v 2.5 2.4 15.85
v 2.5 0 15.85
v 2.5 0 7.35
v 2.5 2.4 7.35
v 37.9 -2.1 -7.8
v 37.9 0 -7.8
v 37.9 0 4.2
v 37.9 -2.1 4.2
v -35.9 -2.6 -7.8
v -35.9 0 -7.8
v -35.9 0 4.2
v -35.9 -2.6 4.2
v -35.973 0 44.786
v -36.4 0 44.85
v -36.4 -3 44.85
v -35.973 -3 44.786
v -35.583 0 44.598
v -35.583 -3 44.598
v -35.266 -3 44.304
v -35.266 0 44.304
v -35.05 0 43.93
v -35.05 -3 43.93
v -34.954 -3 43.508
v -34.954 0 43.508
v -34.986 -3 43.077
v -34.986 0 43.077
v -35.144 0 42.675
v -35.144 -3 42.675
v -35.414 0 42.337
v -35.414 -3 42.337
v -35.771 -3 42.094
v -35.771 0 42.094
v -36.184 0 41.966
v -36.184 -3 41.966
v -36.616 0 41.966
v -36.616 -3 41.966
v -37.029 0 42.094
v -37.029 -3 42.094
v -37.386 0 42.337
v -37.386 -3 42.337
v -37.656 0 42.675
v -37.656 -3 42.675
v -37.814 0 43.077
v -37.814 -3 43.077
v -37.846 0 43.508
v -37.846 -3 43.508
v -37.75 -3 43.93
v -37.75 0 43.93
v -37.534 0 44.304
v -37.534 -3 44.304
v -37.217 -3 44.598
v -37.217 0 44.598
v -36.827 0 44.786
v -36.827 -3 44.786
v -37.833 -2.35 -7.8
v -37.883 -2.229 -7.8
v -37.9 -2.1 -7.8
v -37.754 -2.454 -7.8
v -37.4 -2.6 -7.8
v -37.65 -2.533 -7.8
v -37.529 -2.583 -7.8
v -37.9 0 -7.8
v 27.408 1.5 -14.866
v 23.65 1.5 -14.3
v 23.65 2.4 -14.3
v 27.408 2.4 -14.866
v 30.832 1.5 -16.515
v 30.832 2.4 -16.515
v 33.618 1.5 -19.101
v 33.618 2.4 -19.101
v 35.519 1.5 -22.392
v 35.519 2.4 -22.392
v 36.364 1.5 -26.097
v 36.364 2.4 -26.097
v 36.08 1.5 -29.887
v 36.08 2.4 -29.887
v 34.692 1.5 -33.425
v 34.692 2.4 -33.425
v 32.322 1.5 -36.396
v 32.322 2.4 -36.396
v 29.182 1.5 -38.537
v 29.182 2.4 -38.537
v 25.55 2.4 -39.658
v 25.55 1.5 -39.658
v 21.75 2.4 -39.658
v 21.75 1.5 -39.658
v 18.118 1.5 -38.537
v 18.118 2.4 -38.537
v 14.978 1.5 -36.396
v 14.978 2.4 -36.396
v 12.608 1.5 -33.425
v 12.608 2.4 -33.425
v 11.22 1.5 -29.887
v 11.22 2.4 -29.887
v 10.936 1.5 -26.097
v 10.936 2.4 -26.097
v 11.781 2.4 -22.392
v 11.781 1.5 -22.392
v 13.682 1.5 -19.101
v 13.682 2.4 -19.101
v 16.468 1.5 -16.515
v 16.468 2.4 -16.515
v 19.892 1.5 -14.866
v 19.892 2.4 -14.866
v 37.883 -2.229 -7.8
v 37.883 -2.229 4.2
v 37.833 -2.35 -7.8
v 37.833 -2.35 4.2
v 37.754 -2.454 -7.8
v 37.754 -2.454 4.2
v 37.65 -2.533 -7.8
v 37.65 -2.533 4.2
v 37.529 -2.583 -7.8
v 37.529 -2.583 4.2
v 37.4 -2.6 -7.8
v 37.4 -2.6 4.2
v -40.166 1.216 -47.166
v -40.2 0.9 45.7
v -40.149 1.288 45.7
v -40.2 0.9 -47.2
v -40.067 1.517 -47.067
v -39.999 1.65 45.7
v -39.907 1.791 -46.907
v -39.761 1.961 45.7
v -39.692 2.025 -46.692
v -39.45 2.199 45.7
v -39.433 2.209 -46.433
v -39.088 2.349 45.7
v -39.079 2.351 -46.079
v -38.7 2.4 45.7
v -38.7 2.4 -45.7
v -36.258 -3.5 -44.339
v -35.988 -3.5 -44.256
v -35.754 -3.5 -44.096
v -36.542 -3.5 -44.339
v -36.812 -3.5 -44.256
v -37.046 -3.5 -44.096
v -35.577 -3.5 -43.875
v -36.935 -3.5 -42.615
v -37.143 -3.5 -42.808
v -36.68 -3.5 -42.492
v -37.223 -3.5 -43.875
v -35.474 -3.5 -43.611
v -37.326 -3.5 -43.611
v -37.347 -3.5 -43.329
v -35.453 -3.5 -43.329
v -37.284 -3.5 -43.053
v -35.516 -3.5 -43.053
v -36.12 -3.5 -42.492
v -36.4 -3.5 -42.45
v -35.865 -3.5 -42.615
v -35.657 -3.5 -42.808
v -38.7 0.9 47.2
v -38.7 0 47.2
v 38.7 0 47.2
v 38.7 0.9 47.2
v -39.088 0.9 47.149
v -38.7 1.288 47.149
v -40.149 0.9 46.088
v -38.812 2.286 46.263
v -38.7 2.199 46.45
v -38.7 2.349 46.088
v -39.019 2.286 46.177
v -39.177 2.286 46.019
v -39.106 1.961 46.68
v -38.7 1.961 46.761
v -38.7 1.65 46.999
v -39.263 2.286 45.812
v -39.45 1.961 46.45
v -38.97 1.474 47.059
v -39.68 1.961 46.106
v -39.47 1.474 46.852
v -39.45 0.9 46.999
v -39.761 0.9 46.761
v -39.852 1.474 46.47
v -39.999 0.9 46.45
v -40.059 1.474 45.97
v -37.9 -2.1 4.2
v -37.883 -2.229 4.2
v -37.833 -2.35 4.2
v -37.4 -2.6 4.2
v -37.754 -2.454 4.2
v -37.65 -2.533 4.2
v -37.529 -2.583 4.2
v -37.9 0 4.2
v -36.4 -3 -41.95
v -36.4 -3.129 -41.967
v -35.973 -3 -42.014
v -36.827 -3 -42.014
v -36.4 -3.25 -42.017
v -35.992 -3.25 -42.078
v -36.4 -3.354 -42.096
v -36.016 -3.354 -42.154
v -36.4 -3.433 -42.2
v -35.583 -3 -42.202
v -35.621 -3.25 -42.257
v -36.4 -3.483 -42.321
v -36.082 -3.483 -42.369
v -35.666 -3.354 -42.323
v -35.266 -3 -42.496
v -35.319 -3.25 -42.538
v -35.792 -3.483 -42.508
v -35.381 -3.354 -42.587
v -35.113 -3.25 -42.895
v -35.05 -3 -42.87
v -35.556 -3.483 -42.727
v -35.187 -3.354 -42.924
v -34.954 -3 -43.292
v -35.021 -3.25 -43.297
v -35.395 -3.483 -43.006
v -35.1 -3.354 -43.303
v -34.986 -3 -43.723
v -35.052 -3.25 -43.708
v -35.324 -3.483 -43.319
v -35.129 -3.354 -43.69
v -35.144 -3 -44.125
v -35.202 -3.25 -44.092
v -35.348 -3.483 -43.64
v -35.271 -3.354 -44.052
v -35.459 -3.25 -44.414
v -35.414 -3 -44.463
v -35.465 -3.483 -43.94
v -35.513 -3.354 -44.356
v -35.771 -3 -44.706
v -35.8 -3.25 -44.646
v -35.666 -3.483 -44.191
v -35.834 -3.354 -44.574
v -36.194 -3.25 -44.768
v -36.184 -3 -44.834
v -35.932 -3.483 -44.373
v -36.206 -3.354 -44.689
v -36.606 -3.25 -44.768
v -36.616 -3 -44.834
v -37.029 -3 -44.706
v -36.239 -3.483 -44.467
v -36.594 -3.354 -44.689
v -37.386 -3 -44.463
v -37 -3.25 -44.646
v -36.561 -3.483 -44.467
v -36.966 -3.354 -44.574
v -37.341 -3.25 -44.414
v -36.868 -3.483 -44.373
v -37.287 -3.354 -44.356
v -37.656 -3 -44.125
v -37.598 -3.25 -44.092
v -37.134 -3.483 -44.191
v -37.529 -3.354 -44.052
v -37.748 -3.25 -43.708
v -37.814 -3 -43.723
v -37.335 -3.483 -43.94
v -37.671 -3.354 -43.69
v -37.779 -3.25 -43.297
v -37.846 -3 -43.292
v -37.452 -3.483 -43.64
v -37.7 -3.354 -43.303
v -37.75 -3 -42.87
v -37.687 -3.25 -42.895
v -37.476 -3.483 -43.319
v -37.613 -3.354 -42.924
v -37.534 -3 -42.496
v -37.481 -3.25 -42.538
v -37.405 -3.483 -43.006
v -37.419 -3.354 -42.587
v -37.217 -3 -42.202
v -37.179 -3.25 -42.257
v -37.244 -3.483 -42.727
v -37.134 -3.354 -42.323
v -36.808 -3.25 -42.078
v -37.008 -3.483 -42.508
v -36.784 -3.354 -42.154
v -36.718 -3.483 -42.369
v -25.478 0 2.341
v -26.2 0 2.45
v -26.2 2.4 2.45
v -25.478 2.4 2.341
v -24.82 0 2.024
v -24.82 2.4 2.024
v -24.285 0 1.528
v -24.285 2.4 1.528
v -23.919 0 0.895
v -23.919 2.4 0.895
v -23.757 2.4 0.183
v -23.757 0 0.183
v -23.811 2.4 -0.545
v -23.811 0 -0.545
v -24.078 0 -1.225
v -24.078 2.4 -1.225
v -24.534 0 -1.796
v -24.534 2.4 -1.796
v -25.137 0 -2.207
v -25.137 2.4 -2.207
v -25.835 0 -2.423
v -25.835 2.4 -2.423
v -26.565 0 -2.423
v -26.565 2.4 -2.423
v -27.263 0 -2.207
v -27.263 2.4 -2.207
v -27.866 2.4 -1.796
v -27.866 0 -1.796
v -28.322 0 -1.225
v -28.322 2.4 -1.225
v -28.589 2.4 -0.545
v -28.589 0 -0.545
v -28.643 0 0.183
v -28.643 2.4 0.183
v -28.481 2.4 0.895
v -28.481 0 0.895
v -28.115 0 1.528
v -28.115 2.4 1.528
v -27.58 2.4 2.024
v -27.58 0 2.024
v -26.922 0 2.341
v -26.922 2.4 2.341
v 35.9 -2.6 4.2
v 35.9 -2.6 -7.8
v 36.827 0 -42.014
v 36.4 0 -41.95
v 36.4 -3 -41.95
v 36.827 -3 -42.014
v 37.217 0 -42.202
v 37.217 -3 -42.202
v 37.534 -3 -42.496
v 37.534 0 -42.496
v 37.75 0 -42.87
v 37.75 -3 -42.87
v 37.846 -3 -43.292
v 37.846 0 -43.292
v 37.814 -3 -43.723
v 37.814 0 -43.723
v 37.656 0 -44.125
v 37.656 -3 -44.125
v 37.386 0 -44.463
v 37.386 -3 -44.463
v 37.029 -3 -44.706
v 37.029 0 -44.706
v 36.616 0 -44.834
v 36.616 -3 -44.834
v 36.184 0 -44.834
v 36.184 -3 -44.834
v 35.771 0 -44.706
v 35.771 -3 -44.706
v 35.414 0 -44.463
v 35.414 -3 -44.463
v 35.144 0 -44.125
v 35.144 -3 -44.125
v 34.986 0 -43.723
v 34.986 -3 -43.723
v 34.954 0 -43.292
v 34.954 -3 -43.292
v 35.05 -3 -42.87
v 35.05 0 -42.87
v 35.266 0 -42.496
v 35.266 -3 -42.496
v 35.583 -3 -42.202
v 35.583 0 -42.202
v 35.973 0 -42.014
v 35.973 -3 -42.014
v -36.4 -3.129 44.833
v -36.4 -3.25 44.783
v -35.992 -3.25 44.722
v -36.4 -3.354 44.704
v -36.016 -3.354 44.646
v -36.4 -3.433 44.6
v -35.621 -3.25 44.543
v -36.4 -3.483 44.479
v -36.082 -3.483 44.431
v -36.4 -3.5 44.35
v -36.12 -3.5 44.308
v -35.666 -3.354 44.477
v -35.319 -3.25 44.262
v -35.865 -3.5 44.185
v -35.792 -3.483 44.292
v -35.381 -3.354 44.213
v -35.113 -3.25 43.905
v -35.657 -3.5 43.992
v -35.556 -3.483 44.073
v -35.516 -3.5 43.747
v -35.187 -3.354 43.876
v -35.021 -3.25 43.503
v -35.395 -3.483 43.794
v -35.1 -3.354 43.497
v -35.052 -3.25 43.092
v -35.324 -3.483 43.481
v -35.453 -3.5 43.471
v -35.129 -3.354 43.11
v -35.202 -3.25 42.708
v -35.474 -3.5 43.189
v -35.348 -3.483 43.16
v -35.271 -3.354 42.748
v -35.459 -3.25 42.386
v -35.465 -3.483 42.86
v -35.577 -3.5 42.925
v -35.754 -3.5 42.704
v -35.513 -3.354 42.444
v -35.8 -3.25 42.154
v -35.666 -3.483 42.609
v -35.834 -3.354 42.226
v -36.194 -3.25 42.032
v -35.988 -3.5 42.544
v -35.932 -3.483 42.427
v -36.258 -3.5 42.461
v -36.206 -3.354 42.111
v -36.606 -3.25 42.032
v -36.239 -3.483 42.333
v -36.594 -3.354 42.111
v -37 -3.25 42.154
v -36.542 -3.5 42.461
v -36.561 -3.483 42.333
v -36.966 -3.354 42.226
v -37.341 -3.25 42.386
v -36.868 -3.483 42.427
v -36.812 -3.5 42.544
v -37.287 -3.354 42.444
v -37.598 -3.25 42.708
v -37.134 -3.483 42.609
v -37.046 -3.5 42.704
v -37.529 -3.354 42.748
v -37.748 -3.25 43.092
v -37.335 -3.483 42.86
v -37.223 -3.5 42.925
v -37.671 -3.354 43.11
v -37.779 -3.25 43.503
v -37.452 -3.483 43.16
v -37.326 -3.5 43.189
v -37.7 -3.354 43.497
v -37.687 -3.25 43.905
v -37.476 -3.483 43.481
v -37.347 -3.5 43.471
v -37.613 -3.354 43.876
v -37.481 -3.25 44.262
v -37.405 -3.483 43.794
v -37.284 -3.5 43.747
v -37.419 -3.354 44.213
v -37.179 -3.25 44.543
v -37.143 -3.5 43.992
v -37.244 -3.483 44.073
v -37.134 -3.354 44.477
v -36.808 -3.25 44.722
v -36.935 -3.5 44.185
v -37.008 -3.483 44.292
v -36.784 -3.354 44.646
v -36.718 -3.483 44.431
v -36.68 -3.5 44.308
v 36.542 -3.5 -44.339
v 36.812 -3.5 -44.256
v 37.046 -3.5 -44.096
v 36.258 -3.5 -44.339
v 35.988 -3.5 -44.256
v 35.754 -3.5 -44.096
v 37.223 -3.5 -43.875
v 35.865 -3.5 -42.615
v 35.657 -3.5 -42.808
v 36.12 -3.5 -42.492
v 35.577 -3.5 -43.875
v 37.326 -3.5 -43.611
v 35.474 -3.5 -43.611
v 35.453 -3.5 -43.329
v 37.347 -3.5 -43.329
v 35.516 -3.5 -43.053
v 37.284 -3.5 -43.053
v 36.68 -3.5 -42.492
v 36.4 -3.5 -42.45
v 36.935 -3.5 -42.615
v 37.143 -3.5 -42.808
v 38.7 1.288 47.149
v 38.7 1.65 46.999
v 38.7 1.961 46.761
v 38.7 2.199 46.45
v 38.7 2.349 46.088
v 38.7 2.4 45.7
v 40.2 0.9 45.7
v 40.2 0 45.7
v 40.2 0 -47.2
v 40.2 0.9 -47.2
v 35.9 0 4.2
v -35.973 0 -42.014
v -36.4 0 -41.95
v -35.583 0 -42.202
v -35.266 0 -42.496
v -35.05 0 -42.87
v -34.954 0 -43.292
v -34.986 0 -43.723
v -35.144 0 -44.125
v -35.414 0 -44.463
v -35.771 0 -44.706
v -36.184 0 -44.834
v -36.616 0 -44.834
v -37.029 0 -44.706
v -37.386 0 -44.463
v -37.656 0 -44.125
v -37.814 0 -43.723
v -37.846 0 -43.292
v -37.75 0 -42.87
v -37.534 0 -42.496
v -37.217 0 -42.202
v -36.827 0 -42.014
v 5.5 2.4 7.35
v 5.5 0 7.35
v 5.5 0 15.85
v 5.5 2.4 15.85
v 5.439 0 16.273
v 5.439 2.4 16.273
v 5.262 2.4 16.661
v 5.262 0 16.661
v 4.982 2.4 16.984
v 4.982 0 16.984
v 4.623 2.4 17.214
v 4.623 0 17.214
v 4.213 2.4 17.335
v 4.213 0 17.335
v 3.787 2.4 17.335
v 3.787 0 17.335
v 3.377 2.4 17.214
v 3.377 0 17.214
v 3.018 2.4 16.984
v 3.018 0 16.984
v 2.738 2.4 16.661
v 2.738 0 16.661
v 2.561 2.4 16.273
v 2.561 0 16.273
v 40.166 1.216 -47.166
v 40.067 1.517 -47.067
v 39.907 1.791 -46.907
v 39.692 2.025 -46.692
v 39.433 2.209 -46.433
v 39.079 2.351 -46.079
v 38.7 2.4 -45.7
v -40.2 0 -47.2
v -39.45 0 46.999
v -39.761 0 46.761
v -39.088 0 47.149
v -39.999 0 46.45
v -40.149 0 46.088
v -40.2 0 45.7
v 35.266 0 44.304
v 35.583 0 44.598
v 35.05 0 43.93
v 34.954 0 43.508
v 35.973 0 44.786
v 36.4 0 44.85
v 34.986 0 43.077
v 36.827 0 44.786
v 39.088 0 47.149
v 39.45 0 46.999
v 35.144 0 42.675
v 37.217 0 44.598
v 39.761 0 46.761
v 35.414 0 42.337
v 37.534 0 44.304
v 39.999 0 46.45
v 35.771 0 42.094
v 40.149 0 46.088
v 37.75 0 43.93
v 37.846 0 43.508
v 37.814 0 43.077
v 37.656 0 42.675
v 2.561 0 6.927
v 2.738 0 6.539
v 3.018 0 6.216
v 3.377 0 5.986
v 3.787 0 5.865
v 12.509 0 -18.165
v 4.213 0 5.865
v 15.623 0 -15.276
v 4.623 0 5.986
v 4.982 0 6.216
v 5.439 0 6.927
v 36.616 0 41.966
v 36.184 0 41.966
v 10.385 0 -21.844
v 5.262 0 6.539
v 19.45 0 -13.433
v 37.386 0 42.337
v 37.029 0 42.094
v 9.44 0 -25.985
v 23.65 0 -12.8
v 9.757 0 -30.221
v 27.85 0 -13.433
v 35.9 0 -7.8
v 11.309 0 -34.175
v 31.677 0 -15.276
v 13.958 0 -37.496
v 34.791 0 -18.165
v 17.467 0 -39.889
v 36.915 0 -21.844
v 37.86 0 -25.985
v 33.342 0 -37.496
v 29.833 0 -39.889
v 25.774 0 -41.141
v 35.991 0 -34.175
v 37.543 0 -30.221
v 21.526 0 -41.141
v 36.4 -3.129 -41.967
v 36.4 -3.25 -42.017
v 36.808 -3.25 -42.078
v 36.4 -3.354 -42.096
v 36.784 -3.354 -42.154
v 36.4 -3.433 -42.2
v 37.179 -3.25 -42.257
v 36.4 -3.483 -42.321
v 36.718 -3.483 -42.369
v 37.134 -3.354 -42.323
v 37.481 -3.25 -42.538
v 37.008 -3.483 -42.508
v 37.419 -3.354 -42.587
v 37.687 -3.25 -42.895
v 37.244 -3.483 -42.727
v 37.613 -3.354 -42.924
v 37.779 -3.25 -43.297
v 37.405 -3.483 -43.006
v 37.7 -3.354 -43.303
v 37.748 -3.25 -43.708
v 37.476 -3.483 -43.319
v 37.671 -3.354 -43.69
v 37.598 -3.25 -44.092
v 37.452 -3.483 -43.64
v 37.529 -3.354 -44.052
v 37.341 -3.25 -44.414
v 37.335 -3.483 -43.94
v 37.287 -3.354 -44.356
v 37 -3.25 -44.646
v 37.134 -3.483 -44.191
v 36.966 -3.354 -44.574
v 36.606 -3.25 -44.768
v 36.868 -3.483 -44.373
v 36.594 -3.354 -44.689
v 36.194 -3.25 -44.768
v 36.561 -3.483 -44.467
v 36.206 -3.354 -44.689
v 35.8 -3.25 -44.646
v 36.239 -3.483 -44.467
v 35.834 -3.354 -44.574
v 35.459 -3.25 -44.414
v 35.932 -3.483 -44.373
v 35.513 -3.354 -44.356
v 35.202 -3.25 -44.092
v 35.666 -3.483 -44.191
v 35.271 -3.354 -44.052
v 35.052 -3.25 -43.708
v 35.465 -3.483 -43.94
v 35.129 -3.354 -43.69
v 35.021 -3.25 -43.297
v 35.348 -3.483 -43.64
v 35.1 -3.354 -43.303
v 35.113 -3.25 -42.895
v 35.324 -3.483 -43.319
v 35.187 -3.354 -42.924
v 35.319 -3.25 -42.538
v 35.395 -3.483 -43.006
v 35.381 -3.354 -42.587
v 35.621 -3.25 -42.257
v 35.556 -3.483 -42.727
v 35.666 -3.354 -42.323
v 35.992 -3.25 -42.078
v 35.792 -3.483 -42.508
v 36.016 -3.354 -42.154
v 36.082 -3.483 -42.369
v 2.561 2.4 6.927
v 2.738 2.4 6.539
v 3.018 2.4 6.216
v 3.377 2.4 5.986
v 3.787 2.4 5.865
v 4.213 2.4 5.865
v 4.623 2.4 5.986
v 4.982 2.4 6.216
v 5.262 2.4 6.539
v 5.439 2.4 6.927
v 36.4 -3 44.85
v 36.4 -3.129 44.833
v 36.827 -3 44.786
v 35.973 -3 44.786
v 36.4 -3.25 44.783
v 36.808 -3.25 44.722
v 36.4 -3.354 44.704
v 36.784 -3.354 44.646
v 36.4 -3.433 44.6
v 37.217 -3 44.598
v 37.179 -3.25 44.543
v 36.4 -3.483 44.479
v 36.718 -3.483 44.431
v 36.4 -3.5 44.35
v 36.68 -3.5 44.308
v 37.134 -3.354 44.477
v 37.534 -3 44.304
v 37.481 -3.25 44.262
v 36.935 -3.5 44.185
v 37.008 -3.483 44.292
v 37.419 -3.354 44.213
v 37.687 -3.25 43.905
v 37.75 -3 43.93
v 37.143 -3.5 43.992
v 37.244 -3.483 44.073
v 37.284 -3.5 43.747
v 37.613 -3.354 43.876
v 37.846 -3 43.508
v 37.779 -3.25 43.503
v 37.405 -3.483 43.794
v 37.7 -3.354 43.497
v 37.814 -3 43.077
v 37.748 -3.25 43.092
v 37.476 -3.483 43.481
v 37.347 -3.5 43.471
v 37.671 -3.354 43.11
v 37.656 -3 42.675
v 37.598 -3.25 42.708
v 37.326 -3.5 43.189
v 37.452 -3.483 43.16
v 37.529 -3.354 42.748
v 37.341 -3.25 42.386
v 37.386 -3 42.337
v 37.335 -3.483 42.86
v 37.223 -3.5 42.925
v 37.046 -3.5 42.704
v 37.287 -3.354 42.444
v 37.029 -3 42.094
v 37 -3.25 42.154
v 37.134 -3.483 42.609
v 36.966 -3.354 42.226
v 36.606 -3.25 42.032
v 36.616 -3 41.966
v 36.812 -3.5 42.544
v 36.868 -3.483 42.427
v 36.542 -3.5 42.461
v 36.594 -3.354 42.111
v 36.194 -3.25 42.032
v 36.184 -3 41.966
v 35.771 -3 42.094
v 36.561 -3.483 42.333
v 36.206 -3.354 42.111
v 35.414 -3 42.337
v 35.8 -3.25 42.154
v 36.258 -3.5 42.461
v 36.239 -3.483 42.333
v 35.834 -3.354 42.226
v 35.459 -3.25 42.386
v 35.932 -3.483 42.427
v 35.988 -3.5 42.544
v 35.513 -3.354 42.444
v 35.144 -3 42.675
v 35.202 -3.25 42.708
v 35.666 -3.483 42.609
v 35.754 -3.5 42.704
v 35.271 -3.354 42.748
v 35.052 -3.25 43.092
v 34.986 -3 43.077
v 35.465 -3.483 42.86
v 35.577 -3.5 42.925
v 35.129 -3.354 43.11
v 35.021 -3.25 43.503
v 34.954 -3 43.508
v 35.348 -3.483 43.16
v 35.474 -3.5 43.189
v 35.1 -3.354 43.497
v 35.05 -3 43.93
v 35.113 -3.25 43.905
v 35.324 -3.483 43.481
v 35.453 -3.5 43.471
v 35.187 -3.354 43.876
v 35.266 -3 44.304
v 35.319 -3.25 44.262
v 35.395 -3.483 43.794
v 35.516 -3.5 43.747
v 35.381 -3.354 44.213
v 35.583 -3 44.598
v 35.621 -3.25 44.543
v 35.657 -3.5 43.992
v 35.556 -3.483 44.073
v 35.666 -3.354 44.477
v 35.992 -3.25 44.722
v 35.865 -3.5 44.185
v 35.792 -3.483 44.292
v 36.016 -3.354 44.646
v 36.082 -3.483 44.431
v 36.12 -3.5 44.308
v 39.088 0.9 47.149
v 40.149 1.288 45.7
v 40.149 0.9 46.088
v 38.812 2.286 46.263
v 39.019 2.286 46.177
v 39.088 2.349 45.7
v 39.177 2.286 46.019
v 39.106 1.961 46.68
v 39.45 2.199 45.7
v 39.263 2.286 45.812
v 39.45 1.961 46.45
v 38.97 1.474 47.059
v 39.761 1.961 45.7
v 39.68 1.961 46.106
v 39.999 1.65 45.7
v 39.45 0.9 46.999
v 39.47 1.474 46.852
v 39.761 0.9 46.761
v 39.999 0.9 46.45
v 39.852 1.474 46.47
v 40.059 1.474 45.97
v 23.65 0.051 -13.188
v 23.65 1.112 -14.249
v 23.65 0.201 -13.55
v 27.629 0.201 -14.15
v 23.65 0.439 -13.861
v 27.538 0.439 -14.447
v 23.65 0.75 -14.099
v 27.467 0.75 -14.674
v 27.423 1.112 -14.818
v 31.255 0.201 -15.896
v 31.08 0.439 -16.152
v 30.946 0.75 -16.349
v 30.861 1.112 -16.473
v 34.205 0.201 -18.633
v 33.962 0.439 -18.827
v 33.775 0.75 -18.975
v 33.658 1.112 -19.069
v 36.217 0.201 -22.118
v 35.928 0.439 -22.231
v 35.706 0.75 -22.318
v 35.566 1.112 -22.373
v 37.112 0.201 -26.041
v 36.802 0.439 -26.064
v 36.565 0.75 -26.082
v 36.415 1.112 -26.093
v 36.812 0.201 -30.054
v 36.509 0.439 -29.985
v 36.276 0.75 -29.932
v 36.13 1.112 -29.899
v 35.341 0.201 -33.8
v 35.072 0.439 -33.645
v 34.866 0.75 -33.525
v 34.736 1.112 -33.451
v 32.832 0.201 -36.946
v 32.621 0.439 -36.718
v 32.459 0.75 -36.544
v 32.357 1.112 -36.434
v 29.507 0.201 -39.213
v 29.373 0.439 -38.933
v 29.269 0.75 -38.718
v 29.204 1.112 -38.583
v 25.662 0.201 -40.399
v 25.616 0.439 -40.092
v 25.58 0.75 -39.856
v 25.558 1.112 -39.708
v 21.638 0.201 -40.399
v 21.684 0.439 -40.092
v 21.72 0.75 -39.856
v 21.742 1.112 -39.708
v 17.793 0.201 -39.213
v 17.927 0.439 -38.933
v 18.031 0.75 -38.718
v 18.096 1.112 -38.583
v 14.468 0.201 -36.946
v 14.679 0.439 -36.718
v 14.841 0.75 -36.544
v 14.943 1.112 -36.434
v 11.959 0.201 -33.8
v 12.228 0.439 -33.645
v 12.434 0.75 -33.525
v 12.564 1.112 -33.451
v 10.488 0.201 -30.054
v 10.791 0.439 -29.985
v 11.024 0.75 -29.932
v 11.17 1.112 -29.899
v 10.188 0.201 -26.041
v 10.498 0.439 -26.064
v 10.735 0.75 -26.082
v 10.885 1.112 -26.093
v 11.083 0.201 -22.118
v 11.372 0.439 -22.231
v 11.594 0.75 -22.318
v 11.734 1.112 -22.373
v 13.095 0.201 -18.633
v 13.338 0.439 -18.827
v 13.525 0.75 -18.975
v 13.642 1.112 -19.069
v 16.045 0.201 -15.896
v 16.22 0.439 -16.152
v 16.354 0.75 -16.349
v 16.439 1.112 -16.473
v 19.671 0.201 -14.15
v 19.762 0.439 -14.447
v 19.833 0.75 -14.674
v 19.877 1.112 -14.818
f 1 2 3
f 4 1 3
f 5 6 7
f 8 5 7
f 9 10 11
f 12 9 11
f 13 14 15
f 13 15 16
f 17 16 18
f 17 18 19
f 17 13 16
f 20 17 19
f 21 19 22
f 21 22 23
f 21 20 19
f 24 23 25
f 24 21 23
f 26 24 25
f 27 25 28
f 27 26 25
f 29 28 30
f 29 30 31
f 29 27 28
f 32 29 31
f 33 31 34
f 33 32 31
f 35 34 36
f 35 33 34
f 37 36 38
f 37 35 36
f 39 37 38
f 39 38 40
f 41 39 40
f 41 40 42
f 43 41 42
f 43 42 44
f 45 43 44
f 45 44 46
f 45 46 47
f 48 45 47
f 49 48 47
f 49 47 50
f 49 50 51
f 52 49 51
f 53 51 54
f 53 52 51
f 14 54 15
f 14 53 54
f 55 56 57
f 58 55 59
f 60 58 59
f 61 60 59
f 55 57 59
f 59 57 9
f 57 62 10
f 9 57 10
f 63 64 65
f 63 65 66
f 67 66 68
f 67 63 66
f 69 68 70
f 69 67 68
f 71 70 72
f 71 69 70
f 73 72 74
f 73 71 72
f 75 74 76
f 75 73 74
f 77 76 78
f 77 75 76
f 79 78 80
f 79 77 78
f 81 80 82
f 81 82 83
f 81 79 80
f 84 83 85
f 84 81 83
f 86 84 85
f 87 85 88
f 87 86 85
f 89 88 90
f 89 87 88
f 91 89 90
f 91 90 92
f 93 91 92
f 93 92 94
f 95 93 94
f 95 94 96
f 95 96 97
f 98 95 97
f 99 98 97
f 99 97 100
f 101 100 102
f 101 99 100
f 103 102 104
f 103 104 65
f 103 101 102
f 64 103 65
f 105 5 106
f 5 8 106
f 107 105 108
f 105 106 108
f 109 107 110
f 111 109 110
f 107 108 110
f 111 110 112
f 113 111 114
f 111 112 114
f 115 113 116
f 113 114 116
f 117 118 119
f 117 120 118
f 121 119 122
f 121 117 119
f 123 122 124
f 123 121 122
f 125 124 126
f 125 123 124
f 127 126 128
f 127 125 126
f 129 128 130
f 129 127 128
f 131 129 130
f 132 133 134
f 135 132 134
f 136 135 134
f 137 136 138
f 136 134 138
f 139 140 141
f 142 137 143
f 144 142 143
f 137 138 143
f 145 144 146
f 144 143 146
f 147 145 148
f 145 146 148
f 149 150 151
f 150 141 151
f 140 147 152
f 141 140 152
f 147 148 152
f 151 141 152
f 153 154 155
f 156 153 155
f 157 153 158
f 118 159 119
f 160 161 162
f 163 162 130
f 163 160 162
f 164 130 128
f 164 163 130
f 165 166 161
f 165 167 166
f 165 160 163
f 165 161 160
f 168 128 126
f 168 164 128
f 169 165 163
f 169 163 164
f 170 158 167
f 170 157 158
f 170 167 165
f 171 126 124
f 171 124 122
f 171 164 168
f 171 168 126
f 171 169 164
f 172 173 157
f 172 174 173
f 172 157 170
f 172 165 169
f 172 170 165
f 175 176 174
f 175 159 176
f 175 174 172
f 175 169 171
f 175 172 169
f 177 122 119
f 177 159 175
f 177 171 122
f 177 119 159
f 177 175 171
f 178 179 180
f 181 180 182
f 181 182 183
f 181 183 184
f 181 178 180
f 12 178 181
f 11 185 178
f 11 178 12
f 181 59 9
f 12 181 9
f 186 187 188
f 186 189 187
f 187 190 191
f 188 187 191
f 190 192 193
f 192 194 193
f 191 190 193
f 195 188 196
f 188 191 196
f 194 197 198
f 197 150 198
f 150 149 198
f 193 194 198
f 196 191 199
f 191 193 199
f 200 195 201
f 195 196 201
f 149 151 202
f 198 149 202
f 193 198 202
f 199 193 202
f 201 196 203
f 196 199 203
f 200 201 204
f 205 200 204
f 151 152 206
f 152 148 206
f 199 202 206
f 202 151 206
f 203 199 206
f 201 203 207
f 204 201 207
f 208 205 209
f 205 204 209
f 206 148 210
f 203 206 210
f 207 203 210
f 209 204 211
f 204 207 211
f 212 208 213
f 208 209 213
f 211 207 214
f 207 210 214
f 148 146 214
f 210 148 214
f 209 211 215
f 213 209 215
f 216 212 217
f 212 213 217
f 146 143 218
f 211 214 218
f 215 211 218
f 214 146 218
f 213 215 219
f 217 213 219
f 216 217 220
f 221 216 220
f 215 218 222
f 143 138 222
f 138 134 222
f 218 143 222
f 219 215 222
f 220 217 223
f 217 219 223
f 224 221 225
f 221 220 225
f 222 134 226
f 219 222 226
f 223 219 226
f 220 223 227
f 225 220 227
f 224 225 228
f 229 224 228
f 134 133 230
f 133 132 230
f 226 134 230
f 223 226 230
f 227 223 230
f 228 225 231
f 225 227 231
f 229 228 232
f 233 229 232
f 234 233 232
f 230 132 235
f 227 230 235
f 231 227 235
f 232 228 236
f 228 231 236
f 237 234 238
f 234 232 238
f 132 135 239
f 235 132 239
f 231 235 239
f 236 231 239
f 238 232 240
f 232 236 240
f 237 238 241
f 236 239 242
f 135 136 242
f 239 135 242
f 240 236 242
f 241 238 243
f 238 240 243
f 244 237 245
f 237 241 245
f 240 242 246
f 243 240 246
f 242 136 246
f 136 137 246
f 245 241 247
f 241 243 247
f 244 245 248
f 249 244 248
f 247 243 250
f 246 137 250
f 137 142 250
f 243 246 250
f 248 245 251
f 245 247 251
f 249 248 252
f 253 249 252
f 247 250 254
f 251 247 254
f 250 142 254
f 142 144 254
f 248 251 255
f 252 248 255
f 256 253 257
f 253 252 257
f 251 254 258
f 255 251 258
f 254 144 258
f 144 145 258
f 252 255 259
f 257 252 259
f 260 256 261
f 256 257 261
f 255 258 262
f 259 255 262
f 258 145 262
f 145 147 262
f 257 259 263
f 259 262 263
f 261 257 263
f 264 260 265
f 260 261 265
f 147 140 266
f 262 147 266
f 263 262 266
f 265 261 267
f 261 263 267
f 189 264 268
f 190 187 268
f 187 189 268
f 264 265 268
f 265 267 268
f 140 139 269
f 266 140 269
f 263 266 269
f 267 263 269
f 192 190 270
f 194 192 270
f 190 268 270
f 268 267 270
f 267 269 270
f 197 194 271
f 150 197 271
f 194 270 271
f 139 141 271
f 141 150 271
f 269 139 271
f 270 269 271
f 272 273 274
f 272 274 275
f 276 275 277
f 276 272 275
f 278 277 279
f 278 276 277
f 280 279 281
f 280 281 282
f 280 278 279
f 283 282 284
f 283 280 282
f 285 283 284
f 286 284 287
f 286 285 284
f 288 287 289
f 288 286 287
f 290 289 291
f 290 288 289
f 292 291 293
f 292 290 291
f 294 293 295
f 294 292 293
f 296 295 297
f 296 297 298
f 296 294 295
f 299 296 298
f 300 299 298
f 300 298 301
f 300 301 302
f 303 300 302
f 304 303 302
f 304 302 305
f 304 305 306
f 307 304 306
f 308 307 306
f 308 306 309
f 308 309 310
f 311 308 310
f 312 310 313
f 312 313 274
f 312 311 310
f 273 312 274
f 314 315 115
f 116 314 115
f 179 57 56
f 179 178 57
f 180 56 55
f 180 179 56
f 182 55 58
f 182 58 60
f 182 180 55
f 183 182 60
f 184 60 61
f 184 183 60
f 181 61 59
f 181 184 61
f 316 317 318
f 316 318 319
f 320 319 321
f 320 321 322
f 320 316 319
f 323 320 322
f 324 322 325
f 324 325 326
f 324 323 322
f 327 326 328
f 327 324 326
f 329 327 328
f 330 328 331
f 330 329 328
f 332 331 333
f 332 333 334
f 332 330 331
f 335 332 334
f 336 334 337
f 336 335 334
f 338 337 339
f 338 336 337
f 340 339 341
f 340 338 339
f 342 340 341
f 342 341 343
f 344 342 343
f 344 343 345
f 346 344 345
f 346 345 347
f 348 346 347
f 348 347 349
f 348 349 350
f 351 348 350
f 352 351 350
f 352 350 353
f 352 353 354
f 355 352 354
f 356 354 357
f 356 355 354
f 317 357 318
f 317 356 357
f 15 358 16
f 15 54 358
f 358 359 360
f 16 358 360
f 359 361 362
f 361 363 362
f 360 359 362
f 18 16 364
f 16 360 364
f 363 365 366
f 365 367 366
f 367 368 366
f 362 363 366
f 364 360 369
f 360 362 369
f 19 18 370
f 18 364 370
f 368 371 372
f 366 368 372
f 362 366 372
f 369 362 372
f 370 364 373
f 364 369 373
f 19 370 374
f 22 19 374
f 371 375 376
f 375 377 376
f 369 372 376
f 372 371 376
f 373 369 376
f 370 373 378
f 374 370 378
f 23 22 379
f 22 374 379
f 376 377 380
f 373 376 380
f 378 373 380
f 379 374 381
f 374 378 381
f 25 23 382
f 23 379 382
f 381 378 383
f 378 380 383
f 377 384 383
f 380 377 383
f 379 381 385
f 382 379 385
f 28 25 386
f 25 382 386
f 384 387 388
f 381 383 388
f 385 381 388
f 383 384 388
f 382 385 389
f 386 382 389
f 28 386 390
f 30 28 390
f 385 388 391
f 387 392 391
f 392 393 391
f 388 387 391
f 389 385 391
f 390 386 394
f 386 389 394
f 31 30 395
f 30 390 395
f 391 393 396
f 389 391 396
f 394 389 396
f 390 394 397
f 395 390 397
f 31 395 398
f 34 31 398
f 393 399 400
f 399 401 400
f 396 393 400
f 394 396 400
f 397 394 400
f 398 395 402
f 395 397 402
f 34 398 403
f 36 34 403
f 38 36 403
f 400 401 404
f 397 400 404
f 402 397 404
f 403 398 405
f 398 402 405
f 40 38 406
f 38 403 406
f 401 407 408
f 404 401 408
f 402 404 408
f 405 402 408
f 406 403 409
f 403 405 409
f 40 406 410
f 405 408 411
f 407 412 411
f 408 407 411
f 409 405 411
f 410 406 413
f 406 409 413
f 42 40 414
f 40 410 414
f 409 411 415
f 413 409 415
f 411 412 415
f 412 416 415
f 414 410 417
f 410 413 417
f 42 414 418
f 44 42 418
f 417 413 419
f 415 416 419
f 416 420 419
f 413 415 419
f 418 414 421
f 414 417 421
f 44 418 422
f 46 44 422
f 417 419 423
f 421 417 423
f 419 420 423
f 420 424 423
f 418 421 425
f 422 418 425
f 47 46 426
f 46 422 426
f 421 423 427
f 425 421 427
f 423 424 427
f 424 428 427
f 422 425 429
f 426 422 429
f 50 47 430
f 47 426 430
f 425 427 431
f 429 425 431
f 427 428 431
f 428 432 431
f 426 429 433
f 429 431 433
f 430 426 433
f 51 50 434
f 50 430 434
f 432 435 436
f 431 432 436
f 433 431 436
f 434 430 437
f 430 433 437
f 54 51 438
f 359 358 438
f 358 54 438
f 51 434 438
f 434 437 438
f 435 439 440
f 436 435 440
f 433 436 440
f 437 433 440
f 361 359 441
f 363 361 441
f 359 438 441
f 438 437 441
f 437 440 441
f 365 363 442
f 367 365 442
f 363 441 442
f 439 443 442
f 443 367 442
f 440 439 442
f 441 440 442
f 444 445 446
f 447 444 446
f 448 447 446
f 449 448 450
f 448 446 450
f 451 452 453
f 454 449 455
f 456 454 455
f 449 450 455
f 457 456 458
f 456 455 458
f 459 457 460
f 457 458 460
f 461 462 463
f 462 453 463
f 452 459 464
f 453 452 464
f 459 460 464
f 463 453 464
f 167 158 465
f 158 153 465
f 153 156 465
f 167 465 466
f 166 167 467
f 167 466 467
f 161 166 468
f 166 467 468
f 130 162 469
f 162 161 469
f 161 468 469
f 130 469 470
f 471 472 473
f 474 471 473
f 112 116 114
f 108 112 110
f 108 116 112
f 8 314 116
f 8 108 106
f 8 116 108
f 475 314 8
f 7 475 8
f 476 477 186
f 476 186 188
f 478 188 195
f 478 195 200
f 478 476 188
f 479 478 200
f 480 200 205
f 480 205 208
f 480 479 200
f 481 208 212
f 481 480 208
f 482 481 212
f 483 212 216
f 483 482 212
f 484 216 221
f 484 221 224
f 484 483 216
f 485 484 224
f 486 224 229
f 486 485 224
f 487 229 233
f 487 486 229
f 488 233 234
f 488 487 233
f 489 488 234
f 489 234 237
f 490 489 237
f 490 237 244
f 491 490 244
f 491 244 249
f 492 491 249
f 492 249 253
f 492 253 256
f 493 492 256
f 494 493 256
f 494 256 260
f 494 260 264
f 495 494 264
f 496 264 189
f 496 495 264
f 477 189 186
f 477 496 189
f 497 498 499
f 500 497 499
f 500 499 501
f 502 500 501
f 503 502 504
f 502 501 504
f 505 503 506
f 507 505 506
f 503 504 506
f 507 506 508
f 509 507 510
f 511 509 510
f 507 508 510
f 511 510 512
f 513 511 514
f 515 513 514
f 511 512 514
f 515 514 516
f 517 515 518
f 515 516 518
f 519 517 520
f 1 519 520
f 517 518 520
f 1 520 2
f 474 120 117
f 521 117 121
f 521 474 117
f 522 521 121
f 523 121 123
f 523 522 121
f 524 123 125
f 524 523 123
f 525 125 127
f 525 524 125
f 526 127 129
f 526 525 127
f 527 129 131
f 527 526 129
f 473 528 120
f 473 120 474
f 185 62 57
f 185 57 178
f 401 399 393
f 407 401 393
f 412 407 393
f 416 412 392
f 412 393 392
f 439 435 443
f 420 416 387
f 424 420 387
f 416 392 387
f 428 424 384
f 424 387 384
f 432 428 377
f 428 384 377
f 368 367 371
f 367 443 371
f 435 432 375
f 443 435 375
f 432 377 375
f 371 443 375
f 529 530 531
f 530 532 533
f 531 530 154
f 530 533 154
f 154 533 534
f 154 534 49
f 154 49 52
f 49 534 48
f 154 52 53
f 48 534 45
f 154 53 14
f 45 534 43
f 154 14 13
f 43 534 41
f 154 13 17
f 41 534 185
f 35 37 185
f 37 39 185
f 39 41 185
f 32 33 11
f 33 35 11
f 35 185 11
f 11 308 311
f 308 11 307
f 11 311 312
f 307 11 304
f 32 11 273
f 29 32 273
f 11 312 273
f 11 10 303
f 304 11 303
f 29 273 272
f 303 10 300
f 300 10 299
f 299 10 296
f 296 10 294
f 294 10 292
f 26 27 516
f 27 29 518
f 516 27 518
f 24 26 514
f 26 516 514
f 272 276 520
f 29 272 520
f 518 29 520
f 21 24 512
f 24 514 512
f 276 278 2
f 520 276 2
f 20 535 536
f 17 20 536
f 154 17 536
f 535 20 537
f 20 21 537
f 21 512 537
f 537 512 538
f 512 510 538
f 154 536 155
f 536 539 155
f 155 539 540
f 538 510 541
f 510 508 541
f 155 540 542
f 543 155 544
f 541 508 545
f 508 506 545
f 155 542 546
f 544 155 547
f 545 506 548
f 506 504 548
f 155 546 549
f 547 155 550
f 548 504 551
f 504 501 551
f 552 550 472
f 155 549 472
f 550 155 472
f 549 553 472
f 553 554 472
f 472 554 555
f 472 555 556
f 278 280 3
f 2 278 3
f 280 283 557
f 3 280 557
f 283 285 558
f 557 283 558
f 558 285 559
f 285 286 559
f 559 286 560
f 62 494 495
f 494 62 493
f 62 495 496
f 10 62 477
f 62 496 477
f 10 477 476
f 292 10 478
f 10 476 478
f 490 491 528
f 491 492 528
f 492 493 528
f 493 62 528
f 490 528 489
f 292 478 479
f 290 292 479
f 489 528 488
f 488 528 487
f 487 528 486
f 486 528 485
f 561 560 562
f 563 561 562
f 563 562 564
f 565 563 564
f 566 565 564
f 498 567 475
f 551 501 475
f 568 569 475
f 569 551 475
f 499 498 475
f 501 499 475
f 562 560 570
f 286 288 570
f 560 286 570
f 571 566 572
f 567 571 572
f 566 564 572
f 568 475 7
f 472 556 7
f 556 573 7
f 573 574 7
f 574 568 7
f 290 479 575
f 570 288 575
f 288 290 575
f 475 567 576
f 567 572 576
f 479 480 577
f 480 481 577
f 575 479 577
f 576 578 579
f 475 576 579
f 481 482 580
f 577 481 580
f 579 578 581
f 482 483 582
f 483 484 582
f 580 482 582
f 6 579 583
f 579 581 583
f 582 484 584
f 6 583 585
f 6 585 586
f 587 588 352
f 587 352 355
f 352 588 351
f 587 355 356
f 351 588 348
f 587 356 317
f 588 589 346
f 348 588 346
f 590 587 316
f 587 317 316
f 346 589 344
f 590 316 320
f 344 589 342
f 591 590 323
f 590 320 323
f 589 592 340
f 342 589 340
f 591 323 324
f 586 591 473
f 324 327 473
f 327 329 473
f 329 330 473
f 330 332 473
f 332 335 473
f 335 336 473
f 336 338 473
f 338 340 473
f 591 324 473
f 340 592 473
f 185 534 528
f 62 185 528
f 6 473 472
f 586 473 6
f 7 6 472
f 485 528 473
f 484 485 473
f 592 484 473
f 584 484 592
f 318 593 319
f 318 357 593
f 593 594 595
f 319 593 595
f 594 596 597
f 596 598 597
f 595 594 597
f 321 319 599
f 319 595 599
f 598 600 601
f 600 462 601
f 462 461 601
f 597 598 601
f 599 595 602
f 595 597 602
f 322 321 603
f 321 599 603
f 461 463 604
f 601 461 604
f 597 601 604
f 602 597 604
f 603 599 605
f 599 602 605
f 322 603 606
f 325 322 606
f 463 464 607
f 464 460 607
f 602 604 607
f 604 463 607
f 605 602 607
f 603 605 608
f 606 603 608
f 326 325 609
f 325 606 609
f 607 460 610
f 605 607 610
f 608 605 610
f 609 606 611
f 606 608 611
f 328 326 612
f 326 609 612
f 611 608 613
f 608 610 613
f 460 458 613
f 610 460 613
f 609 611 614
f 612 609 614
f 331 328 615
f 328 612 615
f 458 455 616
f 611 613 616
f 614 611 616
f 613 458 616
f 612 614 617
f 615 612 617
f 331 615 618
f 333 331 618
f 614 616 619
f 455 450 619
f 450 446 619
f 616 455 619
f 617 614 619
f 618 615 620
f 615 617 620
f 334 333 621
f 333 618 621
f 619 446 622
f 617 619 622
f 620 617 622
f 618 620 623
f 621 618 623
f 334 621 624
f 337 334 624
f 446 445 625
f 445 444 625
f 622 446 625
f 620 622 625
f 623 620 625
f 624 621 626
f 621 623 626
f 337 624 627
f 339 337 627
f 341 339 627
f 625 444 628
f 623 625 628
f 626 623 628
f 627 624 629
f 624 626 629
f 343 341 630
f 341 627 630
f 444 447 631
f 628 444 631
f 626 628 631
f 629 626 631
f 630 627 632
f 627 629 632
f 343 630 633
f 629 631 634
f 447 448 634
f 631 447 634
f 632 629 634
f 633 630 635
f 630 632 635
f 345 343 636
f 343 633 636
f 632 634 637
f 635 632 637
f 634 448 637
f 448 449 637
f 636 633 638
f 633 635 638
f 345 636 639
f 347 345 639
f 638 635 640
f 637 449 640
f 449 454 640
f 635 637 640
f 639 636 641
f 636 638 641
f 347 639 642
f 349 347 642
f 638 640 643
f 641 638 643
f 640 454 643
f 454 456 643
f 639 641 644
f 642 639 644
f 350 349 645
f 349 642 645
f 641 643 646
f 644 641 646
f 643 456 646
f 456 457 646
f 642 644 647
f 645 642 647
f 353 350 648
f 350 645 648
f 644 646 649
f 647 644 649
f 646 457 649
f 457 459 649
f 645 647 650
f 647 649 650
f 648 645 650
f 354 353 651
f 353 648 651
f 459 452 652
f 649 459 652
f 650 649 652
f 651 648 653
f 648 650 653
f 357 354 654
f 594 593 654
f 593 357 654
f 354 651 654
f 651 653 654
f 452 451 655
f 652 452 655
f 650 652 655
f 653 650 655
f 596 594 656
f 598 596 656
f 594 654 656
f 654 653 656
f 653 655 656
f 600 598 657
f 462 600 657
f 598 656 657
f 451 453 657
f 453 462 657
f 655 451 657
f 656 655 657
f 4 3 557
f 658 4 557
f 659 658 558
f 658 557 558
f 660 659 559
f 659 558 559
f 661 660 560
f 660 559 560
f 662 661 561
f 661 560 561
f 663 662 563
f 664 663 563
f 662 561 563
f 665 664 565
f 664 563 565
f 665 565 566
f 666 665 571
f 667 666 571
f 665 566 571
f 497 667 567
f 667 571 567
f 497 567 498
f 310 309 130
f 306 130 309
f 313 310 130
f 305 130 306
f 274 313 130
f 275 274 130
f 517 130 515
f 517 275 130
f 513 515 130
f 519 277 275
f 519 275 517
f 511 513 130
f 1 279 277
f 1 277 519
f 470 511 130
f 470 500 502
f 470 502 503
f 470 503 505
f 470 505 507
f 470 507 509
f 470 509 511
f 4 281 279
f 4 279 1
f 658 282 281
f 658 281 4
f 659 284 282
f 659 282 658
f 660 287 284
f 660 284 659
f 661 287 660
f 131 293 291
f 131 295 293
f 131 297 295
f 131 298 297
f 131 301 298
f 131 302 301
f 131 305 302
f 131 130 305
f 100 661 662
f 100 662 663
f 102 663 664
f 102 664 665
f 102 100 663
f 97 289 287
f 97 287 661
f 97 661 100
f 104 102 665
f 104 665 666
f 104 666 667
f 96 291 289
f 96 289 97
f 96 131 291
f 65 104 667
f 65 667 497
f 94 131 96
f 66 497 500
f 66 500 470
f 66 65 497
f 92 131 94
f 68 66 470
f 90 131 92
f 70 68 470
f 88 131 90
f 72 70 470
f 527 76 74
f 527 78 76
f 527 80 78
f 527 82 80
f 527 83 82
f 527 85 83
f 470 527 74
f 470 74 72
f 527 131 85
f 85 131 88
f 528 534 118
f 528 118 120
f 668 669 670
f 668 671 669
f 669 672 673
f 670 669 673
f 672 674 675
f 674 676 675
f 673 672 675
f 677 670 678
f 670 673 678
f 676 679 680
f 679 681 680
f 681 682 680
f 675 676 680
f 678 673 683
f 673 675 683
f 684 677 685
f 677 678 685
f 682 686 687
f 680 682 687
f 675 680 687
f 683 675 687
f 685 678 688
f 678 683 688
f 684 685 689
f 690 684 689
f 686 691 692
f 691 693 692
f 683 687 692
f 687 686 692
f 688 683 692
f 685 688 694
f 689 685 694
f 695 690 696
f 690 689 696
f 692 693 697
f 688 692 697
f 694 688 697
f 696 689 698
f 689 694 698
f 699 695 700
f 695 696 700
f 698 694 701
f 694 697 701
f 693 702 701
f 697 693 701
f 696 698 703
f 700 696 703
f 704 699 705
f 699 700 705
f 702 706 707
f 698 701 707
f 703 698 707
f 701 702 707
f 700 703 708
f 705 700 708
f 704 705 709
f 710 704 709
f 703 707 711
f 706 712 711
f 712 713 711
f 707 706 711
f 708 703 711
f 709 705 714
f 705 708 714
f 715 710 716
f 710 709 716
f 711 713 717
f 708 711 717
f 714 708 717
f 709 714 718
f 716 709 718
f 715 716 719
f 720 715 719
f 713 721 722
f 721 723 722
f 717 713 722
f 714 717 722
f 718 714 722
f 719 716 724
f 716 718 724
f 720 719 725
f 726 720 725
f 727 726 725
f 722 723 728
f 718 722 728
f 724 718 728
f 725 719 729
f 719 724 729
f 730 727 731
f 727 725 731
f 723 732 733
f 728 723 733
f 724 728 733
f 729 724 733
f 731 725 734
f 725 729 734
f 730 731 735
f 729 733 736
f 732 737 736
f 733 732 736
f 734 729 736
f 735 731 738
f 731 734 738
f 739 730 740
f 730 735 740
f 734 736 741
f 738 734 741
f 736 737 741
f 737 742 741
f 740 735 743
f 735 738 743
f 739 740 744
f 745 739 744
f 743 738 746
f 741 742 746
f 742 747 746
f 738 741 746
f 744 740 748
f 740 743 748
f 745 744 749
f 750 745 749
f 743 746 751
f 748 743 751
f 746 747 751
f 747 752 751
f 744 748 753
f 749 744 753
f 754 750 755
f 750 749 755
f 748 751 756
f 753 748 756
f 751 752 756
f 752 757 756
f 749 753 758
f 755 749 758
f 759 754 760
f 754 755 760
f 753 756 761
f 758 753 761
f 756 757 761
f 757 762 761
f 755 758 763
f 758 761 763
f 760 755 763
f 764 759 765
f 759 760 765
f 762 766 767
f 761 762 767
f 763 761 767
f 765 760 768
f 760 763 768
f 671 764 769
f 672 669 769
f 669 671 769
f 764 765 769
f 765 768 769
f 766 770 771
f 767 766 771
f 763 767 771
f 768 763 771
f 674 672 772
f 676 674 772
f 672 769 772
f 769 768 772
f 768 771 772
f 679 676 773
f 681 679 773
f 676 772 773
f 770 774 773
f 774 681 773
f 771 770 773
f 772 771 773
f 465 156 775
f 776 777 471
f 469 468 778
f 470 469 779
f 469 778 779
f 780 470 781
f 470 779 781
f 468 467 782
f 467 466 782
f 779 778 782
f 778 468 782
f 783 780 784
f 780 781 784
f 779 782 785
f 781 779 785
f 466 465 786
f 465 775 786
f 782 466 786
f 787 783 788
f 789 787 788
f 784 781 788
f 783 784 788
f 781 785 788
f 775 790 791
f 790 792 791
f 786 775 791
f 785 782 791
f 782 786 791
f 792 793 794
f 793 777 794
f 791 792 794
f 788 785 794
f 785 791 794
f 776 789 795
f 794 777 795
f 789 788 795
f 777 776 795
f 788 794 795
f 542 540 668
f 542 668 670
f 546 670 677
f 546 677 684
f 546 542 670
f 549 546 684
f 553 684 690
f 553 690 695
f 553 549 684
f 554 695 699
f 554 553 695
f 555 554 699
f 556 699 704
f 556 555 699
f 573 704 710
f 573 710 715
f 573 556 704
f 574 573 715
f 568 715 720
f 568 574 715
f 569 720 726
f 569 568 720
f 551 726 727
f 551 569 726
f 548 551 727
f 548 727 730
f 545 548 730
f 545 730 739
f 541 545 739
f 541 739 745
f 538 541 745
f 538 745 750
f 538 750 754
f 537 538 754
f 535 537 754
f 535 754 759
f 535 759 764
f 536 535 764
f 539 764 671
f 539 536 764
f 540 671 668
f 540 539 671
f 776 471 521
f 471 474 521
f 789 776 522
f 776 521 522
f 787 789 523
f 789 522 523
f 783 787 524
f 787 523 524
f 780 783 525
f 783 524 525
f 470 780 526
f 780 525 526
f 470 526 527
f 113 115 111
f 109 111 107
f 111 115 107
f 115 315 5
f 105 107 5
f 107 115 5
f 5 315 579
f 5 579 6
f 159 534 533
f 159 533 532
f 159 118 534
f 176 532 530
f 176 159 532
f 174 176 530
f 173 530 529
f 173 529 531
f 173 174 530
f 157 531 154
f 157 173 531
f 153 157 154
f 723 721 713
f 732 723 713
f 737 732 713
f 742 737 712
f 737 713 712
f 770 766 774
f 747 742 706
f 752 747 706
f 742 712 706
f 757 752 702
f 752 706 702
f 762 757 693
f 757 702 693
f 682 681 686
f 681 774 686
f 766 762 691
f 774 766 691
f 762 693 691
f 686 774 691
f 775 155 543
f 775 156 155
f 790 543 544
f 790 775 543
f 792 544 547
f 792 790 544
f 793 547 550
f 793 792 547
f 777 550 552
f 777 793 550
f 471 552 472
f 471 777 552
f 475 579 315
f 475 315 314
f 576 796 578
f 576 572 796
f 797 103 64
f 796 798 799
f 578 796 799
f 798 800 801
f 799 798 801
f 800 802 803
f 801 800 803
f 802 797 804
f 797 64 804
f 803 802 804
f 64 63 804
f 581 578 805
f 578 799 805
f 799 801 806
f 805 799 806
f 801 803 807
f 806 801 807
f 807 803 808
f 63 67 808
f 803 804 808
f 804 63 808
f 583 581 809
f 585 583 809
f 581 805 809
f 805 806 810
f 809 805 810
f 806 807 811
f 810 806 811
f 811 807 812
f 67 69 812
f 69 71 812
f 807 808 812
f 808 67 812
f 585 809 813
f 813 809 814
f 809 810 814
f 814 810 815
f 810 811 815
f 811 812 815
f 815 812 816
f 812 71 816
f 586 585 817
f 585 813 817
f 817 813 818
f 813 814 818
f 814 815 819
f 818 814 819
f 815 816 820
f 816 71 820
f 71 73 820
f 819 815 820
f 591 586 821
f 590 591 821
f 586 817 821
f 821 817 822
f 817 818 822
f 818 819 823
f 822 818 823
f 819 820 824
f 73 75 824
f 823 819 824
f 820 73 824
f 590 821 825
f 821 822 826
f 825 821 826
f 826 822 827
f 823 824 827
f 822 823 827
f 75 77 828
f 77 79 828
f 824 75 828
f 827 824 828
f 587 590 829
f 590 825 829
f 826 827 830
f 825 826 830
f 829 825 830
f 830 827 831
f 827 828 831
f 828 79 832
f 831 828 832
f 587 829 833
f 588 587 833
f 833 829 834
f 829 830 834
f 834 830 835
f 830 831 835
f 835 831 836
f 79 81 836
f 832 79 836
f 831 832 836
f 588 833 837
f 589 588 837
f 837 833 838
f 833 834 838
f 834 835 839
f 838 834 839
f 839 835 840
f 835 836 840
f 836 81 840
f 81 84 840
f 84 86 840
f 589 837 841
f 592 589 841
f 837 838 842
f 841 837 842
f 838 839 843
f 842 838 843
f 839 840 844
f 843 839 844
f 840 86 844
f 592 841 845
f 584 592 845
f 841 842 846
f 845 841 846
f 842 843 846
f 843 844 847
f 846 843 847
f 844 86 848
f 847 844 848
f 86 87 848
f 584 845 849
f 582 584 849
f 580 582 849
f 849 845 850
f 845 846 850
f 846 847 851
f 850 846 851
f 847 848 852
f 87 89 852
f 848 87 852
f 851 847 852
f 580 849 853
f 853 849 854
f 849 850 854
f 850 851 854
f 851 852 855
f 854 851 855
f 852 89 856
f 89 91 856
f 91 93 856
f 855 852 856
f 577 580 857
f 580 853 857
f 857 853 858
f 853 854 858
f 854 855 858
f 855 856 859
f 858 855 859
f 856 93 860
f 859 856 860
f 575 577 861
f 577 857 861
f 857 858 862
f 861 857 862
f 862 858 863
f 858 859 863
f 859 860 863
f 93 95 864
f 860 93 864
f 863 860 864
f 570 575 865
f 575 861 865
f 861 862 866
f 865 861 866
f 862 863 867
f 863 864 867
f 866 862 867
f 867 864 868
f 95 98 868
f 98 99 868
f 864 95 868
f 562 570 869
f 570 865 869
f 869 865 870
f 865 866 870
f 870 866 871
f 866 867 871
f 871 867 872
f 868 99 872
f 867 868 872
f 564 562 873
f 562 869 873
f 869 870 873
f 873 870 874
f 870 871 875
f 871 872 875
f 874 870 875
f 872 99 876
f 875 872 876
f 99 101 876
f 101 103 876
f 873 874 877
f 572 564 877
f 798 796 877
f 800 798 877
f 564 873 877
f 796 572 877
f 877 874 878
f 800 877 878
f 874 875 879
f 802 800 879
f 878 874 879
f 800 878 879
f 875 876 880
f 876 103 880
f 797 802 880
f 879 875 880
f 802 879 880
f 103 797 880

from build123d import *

# Parameters (mm, degrees)
SKETCH1_W               = 80.4
SKETCH1_H               = 94.4
SKETCH1_R               = 2.45
SKETCH1_R_2             = 12.75
SKETCH1_R_3             = 1.45
BOSS_EXTRUDE1_DEPTH     = 2.4
FILLET1_R               = 1.5
SKETCH2_W               = 2
SKETCH2_H               = 12
BOSS_EXTRUDE2_DEPTH     = 2.6
FILLET2_R               = 0.5
SKETCH1_4_R             = 1.45
BOSS_EXTRUDE3_DEPTH     = 3.5
FILLET3_R               = 0.5
CUT_EXTRUDE1_DEPTH      = 63.279129731
CUT_EXTRUDE1_DEPTH_BACK = 63.279129731


with BuildPart() as part:
    # Sketch1 → Boss-Extrude1 (new body)
    # profile 1 of 5: a face of its own
    with BuildSketch(Plane(origin=(0, 0, 0), x_dir=(1, 0, 0), z_dir=(0, 1, 0))):
        Rectangle(SKETCH1_W, SKETCH1_H)
        with Locations(Location((-26.2, 0, 0), (0, 0, 270))):
            Circle(SKETCH1_R, mode=Mode.SUBTRACT)
        with Locations(Location((23.65, 27.05, 0), (0, 0, 270))):
            Circle(SKETCH1_R_2, mode=Mode.SUBTRACT)
        with Locations((-36.4, -43.4)):
            Circle(SKETCH1_R_3, mode=Mode.SUBTRACT)
        with Locations((36.4, -43.4)):
            Circle(SKETCH1_R_3, mode=Mode.SUBTRACT)
        with Locations((36.4, 43.4)):
            Circle(SKETCH1_R_3, mode=Mode.SUBTRACT)
        with Locations((-36.4, 43.4)):
            Circle(SKETCH1_R_3, mode=Mode.SUBTRACT)
    # profile 2 of 5: a face of its own
    with BuildSketch(Plane(origin=(0, 0, 0), x_dir=(1, 0, 0), z_dir=(0, 1, 0))):
        with Locations((-36.4, -43.4)):
            Circle(SKETCH1_R_3)
    # profile 3 of 5: a face of its own
    with BuildSketch(Plane(origin=(0, 0, 0), x_dir=(1, 0, 0), z_dir=(0, 1, 0))):
        with Locations((-36.4, 43.4)):
            Circle(SKETCH1_R_3)
    # profile 4 of 5: a face of its own
    with BuildSketch(Plane(origin=(0, 0, 0), x_dir=(1, 0, 0), z_dir=(0, 1, 0))):
        with Locations((36.4, 43.4)):
            Circle(SKETCH1_R_3)
    # profile 5 of 5: a face of its own
    with BuildSketch(Plane(origin=(0, 0, 0), x_dir=(1, 0, 0), z_dir=(0, 1, 0))):
        with Locations((36.4, -43.4)):
            Circle(SKETCH1_R_3)
    extrude(amount=BOSS_EXTRUDE1_DEPTH)

    # Fillet1
    fillet1_edges = [part.edges().sort_by_distance(p)[0] for p in [
        (23.65, 0, -39.8),
        (-40.2, 1.2, 47.2),
        (40.2, 1.2, 47.2),
        (0, 2.4, 47.2),
        (40.2, 2.4, 0),
        (0, 2.4, -47.2),
        (-40.2, 2.4, 0),
    ]]
    fillet(fillet1_edges, radius=FILLET1_R)

    # Sketch2 → Boss-Extrude2 (add)
    with BuildSketch(Plane.XZ):
        with Locations((36.9, -1.8)):
            Rectangle(SKETCH2_W, SKETCH2_H)
        with Locations((-36.9, -1.8)):
            Rectangle(SKETCH2_W, SKETCH2_H)
    extrude(amount=BOSS_EXTRUDE2_DEPTH)

    # Fillet2
    fillet2_edges = [part.edges().sort_by_distance(p)[0] for p in [
        (37.9, -2.6, -1.8),
        (-37.9, -2.6, -1.8),
    ]]
    fillet(fillet2_edges, radius=FILLET2_R)

    # Sketch1<4> → Boss-Extrude3 (add)
    with BuildSketch(Plane(origin=(0, 0, 0), x_dir=(1, 0, 0), z_dir=(0, 1, 0))):
        with Locations(Location((36.4, 43.4, 0), (0, 0, 270))):
            Circle(SKETCH1_4_R)
        with Locations(Location((-36.4, 43.4, 0), (0, 0, 270))):
            Circle(SKETCH1_4_R)
        with Locations(Location((-36.4, -43.4, 0), (0, 0, 270))):
            Circle(SKETCH1_4_R)
        with Locations(Location((36.4, -43.4, 0), (0, 0, 270))):
            Circle(SKETCH1_4_R)
    extrude(amount=-BOSS_EXTRUDE3_DEPTH)

    # Fillet3
    fillet3_edges = [part.edges().sort_by_distance(p)[0] for p in [
        (36.4, -3.5, -44.85),
        (-36.4, -3.5, -44.85),
        (-36.4, -3.5, 41.95),
        (36.4, -3.5, 41.95),
    ]]
    fillet(fillet3_edges, radius=FILLET3_R)

    # Sketch3 → Cut-Extrude1 (cut, two sides: drawn at the far end of the back side and taken through both)
    with BuildSketch(Plane(origin=(0, 2.4, 0), x_dir=(1, 0, 0), z_dir=(0, 1, 0)).offset(-CUT_EXTRUDE1_DEPTH_BACK)):
        with BuildLine():
            Line((5.5, -7.35), (5.5, -15.85))
            ThreePointArc((5.5, -15.85), (4, -17.35), (2.5, -15.85))
            Line((2.5, -15.85), (2.5, -7.35))
            ThreePointArc((2.5, -7.35), (4, -5.85), (5.5, -7.35))
        make_face()
    extrude(amount=CUT_EXTRUDE1_DEPTH + CUT_EXTRUDE1_DEPTH_BACK, mode=Mode.SUBTRACT)


solid = part.part
